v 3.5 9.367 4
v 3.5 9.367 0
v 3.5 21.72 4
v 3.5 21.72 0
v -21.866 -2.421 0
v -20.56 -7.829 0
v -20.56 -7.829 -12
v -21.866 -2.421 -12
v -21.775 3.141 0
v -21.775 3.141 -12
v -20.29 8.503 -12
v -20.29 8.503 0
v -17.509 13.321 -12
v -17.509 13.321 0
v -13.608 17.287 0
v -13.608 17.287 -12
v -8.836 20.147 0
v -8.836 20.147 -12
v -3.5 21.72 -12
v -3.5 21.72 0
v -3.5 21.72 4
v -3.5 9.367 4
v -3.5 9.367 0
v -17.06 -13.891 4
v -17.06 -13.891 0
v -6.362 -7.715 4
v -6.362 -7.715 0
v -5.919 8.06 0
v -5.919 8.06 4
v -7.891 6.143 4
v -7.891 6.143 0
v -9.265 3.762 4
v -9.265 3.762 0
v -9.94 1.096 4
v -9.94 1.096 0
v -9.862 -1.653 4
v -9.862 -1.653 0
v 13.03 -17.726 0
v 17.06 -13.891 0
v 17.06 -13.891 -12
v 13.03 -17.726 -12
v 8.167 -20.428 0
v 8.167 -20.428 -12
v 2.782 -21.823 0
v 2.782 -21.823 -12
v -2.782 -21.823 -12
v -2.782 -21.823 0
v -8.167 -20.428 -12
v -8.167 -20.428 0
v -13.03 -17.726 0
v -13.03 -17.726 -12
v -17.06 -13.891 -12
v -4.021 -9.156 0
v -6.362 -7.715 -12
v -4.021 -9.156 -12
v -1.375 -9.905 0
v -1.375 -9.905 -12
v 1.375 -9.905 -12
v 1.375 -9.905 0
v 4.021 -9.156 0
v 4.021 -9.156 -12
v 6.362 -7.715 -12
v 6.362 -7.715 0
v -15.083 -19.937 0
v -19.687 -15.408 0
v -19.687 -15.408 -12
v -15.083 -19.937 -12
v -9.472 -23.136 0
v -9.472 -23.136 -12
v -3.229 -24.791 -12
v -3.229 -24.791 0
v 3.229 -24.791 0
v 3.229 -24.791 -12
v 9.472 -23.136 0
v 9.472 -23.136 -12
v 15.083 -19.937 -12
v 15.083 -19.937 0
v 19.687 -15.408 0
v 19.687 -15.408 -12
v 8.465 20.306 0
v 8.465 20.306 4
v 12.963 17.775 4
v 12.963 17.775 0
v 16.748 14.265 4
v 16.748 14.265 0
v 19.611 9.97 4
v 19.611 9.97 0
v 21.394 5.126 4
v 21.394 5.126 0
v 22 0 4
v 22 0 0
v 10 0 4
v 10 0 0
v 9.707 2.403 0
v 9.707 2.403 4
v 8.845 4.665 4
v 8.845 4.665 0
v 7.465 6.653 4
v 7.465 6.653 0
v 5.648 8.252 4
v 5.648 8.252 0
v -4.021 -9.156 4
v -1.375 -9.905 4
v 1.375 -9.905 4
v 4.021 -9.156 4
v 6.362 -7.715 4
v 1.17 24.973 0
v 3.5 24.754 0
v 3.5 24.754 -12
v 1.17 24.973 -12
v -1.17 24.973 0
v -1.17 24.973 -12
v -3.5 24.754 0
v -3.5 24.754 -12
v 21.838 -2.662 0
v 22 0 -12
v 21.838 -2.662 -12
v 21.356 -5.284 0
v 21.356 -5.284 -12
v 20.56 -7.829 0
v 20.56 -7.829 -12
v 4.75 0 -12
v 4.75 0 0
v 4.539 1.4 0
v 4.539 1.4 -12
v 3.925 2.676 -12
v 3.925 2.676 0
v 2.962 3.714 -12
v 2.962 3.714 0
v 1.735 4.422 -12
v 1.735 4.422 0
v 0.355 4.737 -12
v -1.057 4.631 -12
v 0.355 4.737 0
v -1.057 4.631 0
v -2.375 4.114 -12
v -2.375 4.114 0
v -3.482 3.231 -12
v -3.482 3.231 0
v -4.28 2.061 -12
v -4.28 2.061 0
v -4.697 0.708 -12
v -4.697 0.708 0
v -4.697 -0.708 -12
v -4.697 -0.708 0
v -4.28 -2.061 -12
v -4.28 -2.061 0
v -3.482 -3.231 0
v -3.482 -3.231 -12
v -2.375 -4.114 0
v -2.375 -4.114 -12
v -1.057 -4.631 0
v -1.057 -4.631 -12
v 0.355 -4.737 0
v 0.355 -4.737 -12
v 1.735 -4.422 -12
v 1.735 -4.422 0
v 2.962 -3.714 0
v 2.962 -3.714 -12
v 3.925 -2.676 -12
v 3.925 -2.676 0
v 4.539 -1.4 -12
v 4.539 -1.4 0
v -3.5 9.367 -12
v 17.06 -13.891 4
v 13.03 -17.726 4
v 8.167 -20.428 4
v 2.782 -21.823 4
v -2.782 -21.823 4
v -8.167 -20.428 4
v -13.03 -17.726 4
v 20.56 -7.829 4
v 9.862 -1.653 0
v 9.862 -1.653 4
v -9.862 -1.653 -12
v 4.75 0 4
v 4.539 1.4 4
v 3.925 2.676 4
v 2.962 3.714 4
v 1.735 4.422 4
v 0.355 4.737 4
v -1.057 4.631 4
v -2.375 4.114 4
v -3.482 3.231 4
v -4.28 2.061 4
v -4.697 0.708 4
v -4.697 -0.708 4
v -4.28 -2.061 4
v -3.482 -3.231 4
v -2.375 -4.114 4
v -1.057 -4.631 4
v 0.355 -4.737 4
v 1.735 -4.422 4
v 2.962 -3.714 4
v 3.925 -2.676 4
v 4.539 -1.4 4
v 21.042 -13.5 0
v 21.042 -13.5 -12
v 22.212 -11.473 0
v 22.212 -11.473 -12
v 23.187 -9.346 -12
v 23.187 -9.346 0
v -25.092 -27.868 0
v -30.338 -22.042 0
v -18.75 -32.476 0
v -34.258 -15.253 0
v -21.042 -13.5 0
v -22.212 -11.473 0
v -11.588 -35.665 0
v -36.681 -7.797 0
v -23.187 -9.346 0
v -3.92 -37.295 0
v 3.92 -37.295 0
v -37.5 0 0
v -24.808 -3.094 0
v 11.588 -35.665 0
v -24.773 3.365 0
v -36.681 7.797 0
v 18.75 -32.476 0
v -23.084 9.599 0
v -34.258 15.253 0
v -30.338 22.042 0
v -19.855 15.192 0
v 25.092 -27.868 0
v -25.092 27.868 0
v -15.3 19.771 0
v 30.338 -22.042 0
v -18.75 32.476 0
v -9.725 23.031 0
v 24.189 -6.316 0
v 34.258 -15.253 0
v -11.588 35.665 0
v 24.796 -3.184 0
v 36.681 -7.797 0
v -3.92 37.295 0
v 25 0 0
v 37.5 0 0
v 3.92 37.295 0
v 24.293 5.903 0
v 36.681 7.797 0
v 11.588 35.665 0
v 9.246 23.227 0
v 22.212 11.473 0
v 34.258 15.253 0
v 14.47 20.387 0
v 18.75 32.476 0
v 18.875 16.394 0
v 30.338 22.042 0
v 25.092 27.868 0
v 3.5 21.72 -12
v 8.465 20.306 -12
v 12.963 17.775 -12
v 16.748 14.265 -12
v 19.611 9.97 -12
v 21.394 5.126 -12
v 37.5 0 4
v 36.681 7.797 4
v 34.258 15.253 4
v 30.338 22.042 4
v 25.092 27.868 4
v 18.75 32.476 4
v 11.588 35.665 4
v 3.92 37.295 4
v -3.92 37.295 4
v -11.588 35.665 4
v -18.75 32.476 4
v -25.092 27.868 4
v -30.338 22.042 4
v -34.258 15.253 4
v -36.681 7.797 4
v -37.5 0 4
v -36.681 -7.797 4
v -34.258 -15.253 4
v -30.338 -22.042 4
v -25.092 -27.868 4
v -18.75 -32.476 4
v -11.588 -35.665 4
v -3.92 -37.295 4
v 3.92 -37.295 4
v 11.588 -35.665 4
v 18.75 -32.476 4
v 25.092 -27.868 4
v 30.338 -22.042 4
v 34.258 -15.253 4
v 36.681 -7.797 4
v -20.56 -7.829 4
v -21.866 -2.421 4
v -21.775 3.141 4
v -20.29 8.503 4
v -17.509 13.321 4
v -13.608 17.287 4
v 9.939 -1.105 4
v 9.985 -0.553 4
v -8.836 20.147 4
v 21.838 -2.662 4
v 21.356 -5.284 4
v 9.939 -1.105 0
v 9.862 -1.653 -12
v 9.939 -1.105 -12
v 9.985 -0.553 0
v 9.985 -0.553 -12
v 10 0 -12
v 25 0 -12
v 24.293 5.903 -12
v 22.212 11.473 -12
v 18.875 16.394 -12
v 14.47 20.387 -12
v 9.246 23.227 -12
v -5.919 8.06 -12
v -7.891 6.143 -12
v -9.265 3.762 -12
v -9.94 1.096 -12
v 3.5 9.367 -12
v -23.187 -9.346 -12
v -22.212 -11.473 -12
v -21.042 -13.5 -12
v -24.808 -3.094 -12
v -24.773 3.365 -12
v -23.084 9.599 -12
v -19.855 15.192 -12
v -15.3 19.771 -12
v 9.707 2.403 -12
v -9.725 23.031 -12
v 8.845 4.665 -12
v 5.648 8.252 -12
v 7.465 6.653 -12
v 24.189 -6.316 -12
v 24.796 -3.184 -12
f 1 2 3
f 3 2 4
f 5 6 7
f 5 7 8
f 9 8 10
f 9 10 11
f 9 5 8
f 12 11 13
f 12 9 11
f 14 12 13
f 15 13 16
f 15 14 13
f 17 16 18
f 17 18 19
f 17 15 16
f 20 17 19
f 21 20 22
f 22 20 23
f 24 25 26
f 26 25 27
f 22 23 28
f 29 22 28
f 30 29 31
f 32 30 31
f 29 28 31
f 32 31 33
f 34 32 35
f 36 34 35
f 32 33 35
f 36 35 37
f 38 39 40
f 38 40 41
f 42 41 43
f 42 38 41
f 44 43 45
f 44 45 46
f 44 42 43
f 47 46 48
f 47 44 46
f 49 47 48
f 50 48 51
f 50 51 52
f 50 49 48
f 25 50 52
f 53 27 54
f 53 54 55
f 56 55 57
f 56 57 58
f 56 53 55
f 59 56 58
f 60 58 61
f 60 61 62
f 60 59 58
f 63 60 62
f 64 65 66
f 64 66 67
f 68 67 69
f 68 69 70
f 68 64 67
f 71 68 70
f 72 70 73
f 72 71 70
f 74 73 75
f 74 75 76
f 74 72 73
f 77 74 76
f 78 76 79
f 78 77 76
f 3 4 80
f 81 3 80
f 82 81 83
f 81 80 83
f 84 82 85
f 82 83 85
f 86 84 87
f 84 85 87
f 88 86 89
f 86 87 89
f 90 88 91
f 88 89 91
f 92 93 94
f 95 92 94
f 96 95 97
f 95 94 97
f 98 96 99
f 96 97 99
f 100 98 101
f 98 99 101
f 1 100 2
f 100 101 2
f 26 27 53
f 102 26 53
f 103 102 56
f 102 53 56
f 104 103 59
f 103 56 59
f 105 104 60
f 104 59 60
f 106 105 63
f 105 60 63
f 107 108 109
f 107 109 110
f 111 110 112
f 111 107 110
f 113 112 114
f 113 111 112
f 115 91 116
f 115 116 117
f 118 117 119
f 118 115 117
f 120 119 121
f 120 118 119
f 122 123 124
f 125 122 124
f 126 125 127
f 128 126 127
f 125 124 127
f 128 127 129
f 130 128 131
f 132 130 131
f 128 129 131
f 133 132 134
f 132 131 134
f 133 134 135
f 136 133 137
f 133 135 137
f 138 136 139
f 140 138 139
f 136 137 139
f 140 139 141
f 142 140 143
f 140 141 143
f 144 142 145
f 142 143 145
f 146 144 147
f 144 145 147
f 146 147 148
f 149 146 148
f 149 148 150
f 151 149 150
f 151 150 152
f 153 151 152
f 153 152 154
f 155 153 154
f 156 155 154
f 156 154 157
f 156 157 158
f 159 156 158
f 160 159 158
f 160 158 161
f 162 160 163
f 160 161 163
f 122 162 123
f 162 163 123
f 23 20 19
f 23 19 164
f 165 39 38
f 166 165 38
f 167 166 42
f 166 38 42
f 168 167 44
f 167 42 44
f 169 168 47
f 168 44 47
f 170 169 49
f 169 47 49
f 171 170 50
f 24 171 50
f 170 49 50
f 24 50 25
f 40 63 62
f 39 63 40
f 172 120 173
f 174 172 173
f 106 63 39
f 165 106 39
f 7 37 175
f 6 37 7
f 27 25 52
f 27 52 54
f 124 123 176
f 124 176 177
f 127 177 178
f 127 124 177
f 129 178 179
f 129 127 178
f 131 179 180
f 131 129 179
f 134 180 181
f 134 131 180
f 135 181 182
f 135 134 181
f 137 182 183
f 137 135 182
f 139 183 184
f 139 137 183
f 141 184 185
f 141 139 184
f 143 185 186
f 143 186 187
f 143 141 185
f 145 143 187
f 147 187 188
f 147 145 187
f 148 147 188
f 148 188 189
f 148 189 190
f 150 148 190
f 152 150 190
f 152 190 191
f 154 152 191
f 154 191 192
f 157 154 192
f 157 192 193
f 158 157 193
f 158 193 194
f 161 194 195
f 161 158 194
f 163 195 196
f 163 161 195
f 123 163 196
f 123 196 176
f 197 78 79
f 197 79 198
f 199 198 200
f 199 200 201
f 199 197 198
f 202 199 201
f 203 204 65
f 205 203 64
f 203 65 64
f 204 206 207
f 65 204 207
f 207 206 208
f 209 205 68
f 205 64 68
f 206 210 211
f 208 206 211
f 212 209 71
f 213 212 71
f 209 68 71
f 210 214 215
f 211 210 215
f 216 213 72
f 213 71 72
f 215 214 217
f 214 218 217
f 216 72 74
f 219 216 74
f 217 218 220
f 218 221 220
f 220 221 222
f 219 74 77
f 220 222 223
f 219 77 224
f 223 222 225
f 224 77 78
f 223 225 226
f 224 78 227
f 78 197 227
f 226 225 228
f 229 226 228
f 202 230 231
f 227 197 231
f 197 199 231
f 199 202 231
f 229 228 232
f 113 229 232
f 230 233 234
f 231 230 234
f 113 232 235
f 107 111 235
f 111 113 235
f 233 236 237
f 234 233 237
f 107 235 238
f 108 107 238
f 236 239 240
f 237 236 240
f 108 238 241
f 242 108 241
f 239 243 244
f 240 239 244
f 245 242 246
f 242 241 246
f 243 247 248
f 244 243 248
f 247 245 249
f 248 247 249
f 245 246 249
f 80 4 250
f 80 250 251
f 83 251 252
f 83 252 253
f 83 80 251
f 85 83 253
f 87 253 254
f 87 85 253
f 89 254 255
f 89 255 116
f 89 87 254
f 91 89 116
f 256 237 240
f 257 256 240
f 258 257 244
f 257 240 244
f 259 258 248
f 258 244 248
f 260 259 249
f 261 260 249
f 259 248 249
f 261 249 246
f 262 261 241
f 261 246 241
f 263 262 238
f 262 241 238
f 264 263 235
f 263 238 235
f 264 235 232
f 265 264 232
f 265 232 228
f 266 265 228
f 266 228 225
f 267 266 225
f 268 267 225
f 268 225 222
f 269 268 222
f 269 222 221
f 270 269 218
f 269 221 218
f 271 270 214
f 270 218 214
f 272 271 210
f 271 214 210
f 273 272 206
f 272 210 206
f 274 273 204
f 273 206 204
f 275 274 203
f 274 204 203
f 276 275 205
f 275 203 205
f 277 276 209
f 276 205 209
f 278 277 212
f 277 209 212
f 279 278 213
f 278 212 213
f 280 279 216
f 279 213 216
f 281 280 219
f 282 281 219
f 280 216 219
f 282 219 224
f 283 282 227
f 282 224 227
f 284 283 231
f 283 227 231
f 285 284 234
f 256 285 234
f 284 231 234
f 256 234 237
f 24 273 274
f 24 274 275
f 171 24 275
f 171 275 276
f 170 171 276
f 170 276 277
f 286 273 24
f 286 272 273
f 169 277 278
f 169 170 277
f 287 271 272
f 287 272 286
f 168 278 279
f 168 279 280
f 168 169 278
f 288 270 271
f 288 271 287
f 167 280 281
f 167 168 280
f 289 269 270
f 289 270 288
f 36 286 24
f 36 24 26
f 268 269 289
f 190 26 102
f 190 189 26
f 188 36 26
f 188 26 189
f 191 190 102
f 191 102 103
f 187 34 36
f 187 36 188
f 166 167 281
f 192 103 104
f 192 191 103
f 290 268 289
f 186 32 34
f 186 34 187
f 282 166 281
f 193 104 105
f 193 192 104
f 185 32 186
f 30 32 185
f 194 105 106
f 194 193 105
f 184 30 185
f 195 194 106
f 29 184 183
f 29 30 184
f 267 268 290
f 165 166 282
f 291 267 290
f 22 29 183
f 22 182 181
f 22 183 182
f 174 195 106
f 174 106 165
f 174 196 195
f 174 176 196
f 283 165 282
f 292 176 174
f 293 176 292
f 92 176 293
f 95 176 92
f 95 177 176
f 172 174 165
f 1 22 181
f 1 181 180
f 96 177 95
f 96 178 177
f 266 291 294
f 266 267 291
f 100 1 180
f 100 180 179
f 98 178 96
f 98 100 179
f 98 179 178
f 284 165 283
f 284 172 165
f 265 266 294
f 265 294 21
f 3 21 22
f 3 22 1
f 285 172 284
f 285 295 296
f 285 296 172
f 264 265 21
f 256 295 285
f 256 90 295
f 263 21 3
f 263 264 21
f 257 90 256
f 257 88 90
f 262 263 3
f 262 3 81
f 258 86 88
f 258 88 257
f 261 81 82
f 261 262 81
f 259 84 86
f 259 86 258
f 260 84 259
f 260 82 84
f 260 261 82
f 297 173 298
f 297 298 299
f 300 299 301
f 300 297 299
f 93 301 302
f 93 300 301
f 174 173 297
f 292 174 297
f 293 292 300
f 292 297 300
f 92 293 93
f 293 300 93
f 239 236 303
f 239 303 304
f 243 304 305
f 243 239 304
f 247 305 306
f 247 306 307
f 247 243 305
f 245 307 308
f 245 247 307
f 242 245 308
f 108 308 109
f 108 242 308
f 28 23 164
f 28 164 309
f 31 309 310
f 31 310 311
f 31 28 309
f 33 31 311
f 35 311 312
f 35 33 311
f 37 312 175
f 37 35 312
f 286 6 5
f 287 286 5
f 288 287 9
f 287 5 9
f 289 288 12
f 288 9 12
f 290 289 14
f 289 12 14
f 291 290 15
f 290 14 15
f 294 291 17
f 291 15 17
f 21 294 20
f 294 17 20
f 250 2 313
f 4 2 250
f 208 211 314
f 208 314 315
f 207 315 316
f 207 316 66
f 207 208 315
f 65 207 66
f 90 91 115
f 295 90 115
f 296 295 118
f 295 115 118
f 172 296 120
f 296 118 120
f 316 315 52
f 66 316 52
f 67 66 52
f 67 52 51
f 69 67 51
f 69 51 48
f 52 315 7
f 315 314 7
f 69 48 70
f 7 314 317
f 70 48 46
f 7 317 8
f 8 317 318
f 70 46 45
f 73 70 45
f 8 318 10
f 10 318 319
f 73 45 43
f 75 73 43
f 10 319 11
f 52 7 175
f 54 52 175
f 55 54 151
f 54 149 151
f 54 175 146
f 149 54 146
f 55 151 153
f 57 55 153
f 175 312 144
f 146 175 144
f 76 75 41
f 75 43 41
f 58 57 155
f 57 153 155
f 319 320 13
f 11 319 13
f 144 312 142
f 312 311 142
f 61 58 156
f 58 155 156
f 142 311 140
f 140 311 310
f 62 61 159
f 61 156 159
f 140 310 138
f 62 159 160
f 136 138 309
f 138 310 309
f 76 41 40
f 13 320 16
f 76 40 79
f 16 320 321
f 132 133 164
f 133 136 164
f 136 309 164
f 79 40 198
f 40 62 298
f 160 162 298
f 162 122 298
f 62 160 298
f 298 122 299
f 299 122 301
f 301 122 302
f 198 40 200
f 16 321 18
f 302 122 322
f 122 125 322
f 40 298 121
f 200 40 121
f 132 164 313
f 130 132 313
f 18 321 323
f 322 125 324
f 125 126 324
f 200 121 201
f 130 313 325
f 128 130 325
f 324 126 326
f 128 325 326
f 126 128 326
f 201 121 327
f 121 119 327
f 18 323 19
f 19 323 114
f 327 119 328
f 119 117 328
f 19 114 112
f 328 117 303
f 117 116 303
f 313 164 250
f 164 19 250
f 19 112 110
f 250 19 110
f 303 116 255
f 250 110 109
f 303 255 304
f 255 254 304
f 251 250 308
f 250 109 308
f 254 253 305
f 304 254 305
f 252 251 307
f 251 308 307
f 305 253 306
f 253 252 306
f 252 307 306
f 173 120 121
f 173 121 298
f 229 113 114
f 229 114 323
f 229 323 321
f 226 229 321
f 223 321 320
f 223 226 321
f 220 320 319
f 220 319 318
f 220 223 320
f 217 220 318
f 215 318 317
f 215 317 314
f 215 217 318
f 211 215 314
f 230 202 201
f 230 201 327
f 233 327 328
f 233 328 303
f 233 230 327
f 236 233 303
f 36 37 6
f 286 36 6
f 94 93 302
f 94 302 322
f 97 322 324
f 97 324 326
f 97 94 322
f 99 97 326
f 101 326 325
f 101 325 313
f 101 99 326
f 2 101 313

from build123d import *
from build123d import SkipClean  # not in build123d's __all__

# Parameters (mm, degrees)
F0_R     = 37.5
F0_R_2   = 4.75
F1_DEPTH = 4
F2_DEPTH = 12


with BuildPart() as f1:
    # F0 (on Top) → F1 (new body)
    with BuildSketch(Plane.XY):
        Circle(F0_R)
        with BuildLine():
            ThreePointArc((3.5, 24.753787589), (18.8745860882, 16.3935963108), (25, 0))
            ThreePointArc((25, 0), (24.5426691937, -4.7599778204), (23.1874088919, -9.3458048812))
            ThreePointArc((23.1874088919, -9.3458048812), (21.6506350946, -12.5), (19.6874088919, -15.4079827077))
            ThreePointArc((19.6874088919, -15.4079827077), (0, -25), (-19.6874088919, -15.4079827077))
            ThreePointArc((-19.6874088919, -15.4079827077), (-21.6506350946, -12.5), (-23.1874088919, -9.3458048812))
            ThreePointArc((-23.1874088919, -9.3458048812), (-21.6506350946, 12.5), (-3.5, 24.753787589))
            ThreePointArc((-3.5, 24.753787589), (0, 25), (3.5, 24.753787589))
        make_face(mode=Mode.SUBTRACT)
        with BuildLine():
            Line((3.5, 21.719806629), (3.5, 24.753787589))
            ThreePointArc((3.5, 24.753787589), (0, 25), (-3.5, 24.753787589))
            Line((-3.5, 24.753787589), (-3.5, 21.719806629))
            ThreePointArc((-3.5, 21.719806629), (0, 22), (3.5, 21.719806629))
        make_face()
        with BuildLine():
            Line((3.5, 9.3674969976), (3.5, 21.719806629))
            ThreePointArc((3.5, 21.719806629), (0, 22), (-3.5, 21.719806629))
            Line((-3.5, 21.719806629), (-3.5, 9.3674969976))
            ThreePointArc((-3.5, 9.3674969976), (0, 10), (3.5, 9.3674969976))
        make_face()
        with BuildLine():
            ThreePointArc((17.059904306, -13.8909922277), (19.0525588833, -11), (20.559904306, -7.8288144012))
            Line((20.559904306, -7.8288144012), (9.8624903698, -1.6526595856))
            ThreePointArc((9.8624903698, -1.6526595856), (8.6602540378, -5), (6.3624903698, -7.714837412))
            Line((6.3624903698, -7.714837412), (17.059904306, -13.8909922277))
        make_face()
        with BuildLine():
            ThreePointArc((19.6874088919, -15.4079827077), (21.6506350946, -12.5), (23.1874088919, -9.3458048812))
            Line((23.1874088919, -9.3458048812), (20.559904306, -7.8288144012))
            ThreePointArc((20.559904306, -7.8288144012), (19.0525588833, -11), (17.059904306, -13.8909922277))
            Line((17.059904306, -13.8909922277), (19.6874088919, -15.4079827077))
        make_face()
        with BuildLine():
            Line((-9.8624903698, -1.6526595856), (-20.559904306, -7.8288144012))
            ThreePointArc((-20.559904306, -7.8288144012), (-19.0525588833, -11), (-17.059904306, -13.8909922277))
            Line((-17.059904306, -13.8909922277), (-6.3624903698, -7.714837412))
            ThreePointArc((-6.3624903698, -7.714837412), (-8.6602540378, -5), (-9.8624903698, -1.6526595856))
        make_face()
        with BuildLine():
            Line((-20.559904306, -7.8288144012), (-23.1874088919, -9.3458048812))
            ThreePointArc((-23.1874088919, -9.3458048812), (-21.6506350946, -12.5), (-19.6874088919, -15.4079827077))
            Line((-19.6874088919, -15.4079827077), (-17.059904306, -13.8909922277))
            ThreePointArc((-17.059904306, -13.8909922277), (-19.0525588833, -11), (-20.559904306, -7.8288144012))
        make_face()
        with BuildLine():
            ThreePointArc((10, 0), (8.2158383626, 5.7008771255), (3.5, 9.3674969976))
            ThreePointArc((3.5, 9.3674969976), (0, 10), (-3.5, 9.3674969976))
            ThreePointArc((-3.5, 9.3674969976), (-8.6602540378, 5), (-9.8624903698, -1.6526595856))
            ThreePointArc((-9.8624903698, -1.6526595856), (-8.6602540378, -5), (-6.3624903698, -7.714837412))
            ThreePointArc((-6.3624903698, -7.714837412), (0, -10), (6.3624903698, -7.714837412))
            ThreePointArc((6.3624903698, -7.714837412), (8.6602540378, -5), (9.8624903698, -1.6526595856))
            ThreePointArc((9.8624903698, -1.6526595856), (9.9655632981, -0.8291852332), (10, 0))
        make_face()
        Circle(F0_R_2, mode=Mode.SUBTRACT)
        with BuildLine():
            ThreePointArc((23.1874088919, -9.3458048812), (24.5426691937, -4.7599778204), (25, 0))
            ThreePointArc((25, 0), (18.8745860882, 16.3935963108), (3.5, 24.753787589))
            Line((3.5, 24.753787589), (3.5, 21.719806629))
            ThreePointArc((3.5, 21.719806629), (16.7481342244, 14.2653426177), (22, 0))
            ThreePointArc((22, 0), (21.6369810132, -3.9800819884), (20.559904306, -7.8288144012))
            Line((20.559904306, -7.8288144012), (23.1874088919, -9.3458048812))
        make_face()
        with BuildLine():
            ThreePointArc((-19.6874088919, -15.4079827077), (0, -25), (19.6874088919, -15.4079827077))
            Line((19.6874088919, -15.4079827077), (17.059904306, -13.8909922277))
            ThreePointArc((17.059904306, -13.8909922277), (0, -22), (-17.059904306, -13.8909922277))
            Line((-17.059904306, -13.8909922277), (-19.6874088919, -15.4079827077))
        make_face()
        with BuildLine():
            Line((-3.5, 21.719806629), (-3.5, 24.753787589))
            ThreePointArc((-3.5, 24.753787589), (-21.6506350946, 12.5), (-23.1874088919, -9.3458048812))
            Line((-23.1874088919, -9.3458048812), (-20.559904306, -7.8288144012))
            ThreePointArc((-20.559904306, -7.8288144012), (-19.0525588833, 11), (-3.5, 21.719806629))
        make_face()
    extrude(amount=F1_DEPTH)

    # F0 (on Top) → F2 (join)
    with BuildSketch(Plane.XY):
        with BuildLine():
            ThreePointArc((23.1874088919, -9.3458048812), (24.5426691937, -4.7599778204), (25, 0))
            ThreePointArc((25, 0), (18.8745860882, 16.3935963108), (3.5, 24.753787589))
            Line((3.5, 24.753787589), (3.5, 21.719806629))
            ThreePointArc((3.5, 21.719806629), (16.7481342244, 14.2653426177), (22, 0))
            ThreePointArc((22, 0), (21.6369810132, -3.9800819884), (20.559904306, -7.8288144012))
            Line((20.559904306, -7.8288144012), (23.1874088919, -9.3458048812))
        make_face()
        with BuildLine():
            Line((3.5, 21.719806629), (3.5, 24.753787589))
            ThreePointArc((3.5, 24.753787589), (0, 25), (-3.5, 24.753787589))
            Line((-3.5, 24.753787589), (-3.5, 21.719806629))
            ThreePointArc((-3.5, 21.719806629), (0, 22), (3.5, 21.719806629))
        make_face()
        with BuildLine():
            Line((-3.5, 21.719806629), (-3.5, 24.753787589))
            ThreePointArc((-3.5, 24.753787589), (-21.6506350946, 12.5), (-23.1874088919, -9.3458048812))
            Line((-23.1874088919, -9.3458048812), (-20.559904306, -7.8288144012))
            ThreePointArc((-20.559904306, -7.8288144012), (-19.0525588833, 11), (-3.5, 21.719806629))
        make_face()
        with BuildLine():
            Line((-20.559904306, -7.8288144012), (-23.1874088919, -9.3458048812))
            ThreePointArc((-23.1874088919, -9.3458048812), (-21.6506350946, -12.5), (-19.6874088919, -15.4079827077))
            Line((-19.6874088919, -15.4079827077), (-17.059904306, -13.8909922277))
            ThreePointArc((-17.059904306, -13.8909922277), (-19.0525588833, -11), (-20.559904306, -7.8288144012))
        make_face()
        with BuildLine():
            ThreePointArc((-19.6874088919, -15.4079827077), (0, -25), (19.6874088919, -15.4079827077))
            Line((19.6874088919, -15.4079827077), (17.059904306, -13.8909922277))
            ThreePointArc((17.059904306, -13.8909922277), (0, -22), (-17.059904306, -13.8909922277))
            Line((-17.059904306, -13.8909922277), (-19.6874088919, -15.4079827077))
        make_face()
        with BuildLine():
            ThreePointArc((19.6874088919, -15.4079827077), (21.6506350946, -12.5), (23.1874088919, -9.3458048812))
            Line((23.1874088919, -9.3458048812), (20.559904306, -7.8288144012))
            ThreePointArc((20.559904306, -7.8288144012), (19.0525588833, -11), (17.059904306, -13.8909922277))
            Line((17.059904306, -13.8909922277), (19.6874088919, -15.4079827077))
        make_face()
        with BuildLine():
            Line((3.5, 9.3674969976), (3.5, 21.719806629))
            ThreePointArc((3.5, 21.719806629), (0, 22), (-3.5, 21.719806629))
            Line((-3.5, 21.719806629), (-3.5, 9.3674969976))
            ThreePointArc((-3.5, 9.3674969976), (0, 10), (3.5, 9.3674969976))
        make_face()
        with BuildLine():
            ThreePointArc((17.059904306, -13.8909922277), (19.0525588833, -11), (20.559904306, -7.8288144012))
            Line((20.559904306, -7.8288144012), (9.8624903698, -1.6526595856))
            ThreePointArc((9.8624903698, -1.6526595856), (8.6602540378, -5), (6.3624903698, -7.714837412))
            Line((6.3624903698, -7.714837412), (17.059904306, -13.8909922277))
        make_face()
        with BuildLine():
            Line((-9.8624903698, -1.6526595856), (-20.559904306, -7.8288144012))
            ThreePointArc((-20.559904306, -7.8288144012), (-19.0525588833, -11), (-17.059904306, -13.8909922277))
            Line((-17.059904306, -13.8909922277), (-6.3624903698, -7.714837412))
            ThreePointArc((-6.3624903698, -7.714837412), (-8.6602540378, -5), (-9.8624903698, -1.6526595856))
        make_face()
        with BuildLine():
            ThreePointArc((10, 0), (8.2158383626, 5.7008771255), (3.5, 9.3674969976))
            ThreePointArc((3.5, 9.3674969976), (0, 10), (-3.5, 9.3674969976))
            ThreePointArc((-3.5, 9.3674969976), (-8.6602540378, 5), (-9.8624903698, -1.6526595856))
            ThreePointArc((-9.8624903698, -1.6526595856), (-8.6602540378, -5), (-6.3624903698, -7.714837412))
            ThreePointArc((-6.3624903698, -7.714837412), (0, -10), (6.3624903698, -7.714837412))
            ThreePointArc((6.3624903698, -7.714837412), (8.6602540378, -5), (9.8624903698, -1.6526595856))
            ThreePointArc((9.8624903698, -1.6526595856), (9.9655632981, -0.8291852332), (10, 0))
        make_face()
        Circle(F0_R_2, mode=Mode.SUBTRACT)
    with SkipClean():  # cleaning this boolean's faces spoils the solid; the shape is the same uncleaned
        extrude(amount=-F2_DEPTH)


solid = f1.part
